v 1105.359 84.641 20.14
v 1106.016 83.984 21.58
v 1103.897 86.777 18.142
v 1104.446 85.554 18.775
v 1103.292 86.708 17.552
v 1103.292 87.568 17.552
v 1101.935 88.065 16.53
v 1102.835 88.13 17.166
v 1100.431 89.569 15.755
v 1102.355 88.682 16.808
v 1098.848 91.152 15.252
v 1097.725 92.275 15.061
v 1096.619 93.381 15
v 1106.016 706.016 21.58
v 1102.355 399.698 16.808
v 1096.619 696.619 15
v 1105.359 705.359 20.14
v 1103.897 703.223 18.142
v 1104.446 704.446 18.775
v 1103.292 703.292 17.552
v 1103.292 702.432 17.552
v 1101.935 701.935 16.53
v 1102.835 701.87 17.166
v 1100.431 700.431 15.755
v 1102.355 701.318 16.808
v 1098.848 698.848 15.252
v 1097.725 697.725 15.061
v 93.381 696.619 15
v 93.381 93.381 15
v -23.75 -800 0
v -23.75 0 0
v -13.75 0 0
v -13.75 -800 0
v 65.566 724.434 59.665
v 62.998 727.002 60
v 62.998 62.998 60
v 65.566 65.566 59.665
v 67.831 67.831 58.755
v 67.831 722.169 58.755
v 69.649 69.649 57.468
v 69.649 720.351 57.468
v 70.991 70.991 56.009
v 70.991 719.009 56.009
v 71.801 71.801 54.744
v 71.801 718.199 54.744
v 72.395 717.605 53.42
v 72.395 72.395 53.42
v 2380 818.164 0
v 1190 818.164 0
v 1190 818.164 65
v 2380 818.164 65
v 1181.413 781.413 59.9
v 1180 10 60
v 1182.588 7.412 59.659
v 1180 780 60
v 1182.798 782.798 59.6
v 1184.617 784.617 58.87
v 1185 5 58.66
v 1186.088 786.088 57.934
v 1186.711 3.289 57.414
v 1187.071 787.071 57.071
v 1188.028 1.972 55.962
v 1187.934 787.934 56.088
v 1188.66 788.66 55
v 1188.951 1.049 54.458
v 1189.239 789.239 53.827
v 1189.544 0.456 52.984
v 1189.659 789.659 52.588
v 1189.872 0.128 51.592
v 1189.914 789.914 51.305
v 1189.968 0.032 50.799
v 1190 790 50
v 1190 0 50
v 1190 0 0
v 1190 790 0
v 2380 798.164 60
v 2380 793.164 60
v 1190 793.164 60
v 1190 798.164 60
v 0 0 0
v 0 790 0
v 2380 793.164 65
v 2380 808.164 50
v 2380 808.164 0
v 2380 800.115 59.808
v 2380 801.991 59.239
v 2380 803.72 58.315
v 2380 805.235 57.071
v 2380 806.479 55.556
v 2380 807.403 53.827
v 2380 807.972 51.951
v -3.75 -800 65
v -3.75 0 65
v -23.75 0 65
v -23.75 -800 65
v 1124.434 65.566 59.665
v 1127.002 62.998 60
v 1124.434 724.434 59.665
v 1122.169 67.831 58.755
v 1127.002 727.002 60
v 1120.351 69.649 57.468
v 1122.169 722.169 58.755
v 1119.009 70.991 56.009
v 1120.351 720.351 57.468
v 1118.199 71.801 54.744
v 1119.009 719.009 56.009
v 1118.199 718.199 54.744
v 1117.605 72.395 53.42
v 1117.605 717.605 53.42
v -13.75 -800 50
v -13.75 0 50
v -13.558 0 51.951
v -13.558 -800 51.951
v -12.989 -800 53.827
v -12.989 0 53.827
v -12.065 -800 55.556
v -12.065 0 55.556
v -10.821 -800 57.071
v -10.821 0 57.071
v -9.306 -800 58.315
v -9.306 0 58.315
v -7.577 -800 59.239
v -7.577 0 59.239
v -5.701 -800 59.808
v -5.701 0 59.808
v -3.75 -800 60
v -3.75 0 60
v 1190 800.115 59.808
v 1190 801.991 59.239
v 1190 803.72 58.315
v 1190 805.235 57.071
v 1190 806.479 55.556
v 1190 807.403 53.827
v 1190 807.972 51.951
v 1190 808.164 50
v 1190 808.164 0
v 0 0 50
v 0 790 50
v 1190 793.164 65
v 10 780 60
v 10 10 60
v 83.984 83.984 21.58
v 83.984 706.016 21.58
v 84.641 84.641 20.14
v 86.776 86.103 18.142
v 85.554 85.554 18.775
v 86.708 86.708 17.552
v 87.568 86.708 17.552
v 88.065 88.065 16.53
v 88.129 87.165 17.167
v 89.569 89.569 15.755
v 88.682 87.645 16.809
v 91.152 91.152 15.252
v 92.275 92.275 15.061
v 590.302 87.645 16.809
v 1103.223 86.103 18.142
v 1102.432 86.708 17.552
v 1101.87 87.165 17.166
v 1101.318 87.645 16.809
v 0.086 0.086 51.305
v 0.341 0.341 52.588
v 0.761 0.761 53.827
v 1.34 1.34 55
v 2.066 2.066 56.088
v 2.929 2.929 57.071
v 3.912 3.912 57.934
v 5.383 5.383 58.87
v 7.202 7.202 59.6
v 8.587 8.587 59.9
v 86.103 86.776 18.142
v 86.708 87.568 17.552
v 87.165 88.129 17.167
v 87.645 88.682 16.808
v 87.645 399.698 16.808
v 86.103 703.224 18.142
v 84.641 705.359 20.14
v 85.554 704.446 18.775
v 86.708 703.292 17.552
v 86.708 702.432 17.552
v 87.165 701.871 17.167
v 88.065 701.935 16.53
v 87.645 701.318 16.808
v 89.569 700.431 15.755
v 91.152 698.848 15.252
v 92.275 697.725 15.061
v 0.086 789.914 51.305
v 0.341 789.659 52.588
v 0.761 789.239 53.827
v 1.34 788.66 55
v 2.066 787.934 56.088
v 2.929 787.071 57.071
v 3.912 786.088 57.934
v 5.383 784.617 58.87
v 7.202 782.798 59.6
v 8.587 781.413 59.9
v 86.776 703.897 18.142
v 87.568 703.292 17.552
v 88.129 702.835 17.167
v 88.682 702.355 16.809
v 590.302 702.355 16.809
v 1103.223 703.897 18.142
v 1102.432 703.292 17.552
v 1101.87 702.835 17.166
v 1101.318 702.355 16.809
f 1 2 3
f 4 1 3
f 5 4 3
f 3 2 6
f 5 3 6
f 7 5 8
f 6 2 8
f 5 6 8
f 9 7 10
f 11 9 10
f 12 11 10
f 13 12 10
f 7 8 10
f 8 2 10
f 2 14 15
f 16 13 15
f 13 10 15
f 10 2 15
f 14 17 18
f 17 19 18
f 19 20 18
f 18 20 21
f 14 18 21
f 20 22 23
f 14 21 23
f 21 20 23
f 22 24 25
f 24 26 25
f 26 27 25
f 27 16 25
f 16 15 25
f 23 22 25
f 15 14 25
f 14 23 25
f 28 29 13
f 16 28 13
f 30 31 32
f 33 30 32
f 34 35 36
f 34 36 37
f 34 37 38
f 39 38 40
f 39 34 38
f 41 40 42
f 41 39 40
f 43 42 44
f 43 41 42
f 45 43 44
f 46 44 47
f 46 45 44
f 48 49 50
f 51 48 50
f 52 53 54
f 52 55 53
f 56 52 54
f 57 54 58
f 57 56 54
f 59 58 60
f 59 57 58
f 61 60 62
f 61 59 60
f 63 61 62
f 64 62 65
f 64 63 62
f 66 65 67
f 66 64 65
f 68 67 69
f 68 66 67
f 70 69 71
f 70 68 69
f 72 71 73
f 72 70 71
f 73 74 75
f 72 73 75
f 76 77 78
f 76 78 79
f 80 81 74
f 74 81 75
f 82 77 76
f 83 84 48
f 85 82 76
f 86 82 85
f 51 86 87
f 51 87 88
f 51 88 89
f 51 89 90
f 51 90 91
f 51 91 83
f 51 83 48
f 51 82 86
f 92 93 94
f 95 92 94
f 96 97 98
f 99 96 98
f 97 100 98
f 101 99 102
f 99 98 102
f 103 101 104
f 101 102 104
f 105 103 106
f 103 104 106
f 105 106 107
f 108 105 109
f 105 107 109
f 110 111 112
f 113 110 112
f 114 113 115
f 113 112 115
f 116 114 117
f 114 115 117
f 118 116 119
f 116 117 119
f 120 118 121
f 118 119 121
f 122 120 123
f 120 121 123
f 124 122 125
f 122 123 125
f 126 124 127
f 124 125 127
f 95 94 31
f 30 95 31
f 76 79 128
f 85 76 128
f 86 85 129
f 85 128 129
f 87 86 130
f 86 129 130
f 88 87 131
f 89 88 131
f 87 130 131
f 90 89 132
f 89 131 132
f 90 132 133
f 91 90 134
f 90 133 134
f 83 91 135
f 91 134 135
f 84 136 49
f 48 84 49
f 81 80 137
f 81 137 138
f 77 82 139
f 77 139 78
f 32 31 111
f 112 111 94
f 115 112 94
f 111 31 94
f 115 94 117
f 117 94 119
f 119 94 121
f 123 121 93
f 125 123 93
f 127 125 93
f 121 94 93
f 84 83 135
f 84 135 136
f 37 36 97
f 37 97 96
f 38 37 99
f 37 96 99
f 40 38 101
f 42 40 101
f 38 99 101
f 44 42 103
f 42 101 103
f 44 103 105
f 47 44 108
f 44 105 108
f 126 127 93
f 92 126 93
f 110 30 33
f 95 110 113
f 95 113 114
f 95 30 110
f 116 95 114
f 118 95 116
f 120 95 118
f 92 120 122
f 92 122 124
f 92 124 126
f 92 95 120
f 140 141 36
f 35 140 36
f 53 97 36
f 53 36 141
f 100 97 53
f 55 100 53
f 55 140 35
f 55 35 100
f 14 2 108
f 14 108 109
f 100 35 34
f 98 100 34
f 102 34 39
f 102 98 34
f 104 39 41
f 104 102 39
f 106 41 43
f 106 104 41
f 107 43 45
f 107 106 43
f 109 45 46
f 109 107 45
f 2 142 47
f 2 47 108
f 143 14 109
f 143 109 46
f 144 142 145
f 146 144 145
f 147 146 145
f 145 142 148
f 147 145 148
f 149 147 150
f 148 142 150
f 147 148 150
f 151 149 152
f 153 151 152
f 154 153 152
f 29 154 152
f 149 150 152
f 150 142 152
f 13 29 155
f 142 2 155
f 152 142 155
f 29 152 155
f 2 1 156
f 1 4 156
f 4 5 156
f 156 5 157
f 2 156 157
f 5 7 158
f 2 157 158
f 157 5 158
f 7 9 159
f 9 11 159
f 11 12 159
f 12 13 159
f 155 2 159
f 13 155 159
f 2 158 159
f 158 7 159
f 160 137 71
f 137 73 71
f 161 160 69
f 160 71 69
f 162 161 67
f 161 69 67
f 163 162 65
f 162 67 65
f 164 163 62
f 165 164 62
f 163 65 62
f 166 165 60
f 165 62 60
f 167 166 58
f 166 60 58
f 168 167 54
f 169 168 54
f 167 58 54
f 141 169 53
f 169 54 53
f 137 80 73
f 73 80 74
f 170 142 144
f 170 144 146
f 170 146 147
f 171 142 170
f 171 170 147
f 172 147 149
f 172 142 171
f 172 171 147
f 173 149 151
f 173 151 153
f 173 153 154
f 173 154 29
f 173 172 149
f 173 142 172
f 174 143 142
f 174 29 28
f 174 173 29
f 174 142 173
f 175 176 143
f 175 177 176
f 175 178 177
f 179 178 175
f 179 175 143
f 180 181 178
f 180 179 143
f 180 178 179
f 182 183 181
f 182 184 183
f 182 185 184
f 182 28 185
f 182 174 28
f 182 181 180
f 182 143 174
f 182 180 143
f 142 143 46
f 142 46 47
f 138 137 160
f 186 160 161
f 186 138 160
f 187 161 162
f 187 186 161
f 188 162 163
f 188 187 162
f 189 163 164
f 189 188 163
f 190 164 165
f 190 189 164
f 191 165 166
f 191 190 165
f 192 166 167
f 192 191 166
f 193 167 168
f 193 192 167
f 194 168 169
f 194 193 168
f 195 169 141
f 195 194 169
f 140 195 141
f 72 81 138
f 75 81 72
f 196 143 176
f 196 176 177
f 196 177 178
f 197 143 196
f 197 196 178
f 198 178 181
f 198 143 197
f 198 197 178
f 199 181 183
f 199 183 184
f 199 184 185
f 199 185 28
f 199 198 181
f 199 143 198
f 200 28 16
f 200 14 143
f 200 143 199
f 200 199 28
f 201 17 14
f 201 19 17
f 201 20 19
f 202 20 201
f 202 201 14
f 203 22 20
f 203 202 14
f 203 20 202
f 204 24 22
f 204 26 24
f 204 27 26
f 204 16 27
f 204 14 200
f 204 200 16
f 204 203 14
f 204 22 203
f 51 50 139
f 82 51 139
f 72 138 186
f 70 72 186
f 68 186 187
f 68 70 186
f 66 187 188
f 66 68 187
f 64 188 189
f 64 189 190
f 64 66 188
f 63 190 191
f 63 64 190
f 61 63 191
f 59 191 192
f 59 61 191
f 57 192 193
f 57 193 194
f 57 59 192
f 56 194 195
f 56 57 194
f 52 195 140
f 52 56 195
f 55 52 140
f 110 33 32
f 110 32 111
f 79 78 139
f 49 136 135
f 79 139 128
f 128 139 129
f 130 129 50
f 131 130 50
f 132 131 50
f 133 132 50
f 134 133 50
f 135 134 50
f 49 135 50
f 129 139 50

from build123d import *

# Parameters (mm, degrees)
F0_W     = 1190
F0_H     = 790
F1_DEPTH = 60
F2_W     = 1050
F2_H     = 650
F3_DEPTH = 45
F3_TAPER = 20
F4_R     = 10
F5_R     = 10
F7_DEPTH = 800
F9_DEPTH = 1190


with BuildPart() as f1:
    # F0 (on Top) → F1 (new body)
    with BuildSketch(Plane.XY):
        with Locations((595, 395)):
            Rectangle(F0_W, F0_H)
    extrude(amount=F1_DEPTH)

    # F2 (on face) → F3 (cut)
    with BuildSketch(Plane.XY.offset(60)):
        with Locations((595, 395)):
            Rectangle(F2_W, F2_H)
    extrude(amount=-F3_DEPTH, taper=F3_TAPER, mode=Mode.SUBTRACT)

    # F4
    f4_edges = [f1.edges().sort_by_distance(p)[0] for p in [
        (0, 395, 60),
        (595, 790, 60),
        (1190, 395, 60),
        (595, 0, 60),
        (70, 395, 60),
        (595, 720, 60),
        (1120, 395, 60),
        (595, 70, 60),
    ]]
    fillet(f4_edges, radius=F4_R)

    # F5
    f5_edges = [f1.edges().sort_by_distance(p)[0] for p in [
        (86.378661, 395, 15),
        (595, 703.621339, 15),
        (1103.621339, 395, 15),
        (595, 86.378661, 15),
    ]]
    fillet(f5_edges, radius=F5_R)


with BuildPart() as f7:
    # F6 (on Front) → F7 (new body)
    with BuildSketch(Plane.XZ):
        with BuildLine():
            Line((-23.7499997749, 65), (-23.7499997749, 0))
            Line((-23.7499997749, 0), (-13.7499997749, 0))
            Line((-13.7499997749, 0), (-13.7499997749, 50))
            ThreePointArc((-13.7499997749, 50), (-10.8210675867, 57.0710678119), (-3.7499997749, 60))
            Line((-3.7499997749, 60), (-3.7499997749, 65))
            Line((-3.7499997749, 65), (-13.7499997749, 65))
            Line((-13.7499997749, 65), (-23.7499997749, 65))
        make_face()
    extrude(amount=F7_DEPTH)


with BuildPart() as f9:
    # F8 (on face) → F9 (new body)
    with BuildSketch(Plane.YZ.offset(1190)):
        with BuildLine():
            Line((808.1638216972, 50), (808.1638216972, 0))
            Line((808.1638216972, 0), (818.1638216972, 0))
            Line((818.1638216972, 0), (818.1638216972, 50))
            Line((818.1638216972, 50), (818.1638216972, 65))
            Line((818.1638216972, 65), (793.1638216972, 65))
            Line((793.1638216972, 65), (793.1638216972, 60))
            Line((793.1638216972, 60), (798.1638216972, 60))
            ThreePointArc((798.1638216972, 60), (805.2348895091, 57.0710678119), (808.1638216972, 50))
        make_face()
    extrude(amount=F9_DEPTH)


solid = Compound([f1.part, f7.part, f9.part])
